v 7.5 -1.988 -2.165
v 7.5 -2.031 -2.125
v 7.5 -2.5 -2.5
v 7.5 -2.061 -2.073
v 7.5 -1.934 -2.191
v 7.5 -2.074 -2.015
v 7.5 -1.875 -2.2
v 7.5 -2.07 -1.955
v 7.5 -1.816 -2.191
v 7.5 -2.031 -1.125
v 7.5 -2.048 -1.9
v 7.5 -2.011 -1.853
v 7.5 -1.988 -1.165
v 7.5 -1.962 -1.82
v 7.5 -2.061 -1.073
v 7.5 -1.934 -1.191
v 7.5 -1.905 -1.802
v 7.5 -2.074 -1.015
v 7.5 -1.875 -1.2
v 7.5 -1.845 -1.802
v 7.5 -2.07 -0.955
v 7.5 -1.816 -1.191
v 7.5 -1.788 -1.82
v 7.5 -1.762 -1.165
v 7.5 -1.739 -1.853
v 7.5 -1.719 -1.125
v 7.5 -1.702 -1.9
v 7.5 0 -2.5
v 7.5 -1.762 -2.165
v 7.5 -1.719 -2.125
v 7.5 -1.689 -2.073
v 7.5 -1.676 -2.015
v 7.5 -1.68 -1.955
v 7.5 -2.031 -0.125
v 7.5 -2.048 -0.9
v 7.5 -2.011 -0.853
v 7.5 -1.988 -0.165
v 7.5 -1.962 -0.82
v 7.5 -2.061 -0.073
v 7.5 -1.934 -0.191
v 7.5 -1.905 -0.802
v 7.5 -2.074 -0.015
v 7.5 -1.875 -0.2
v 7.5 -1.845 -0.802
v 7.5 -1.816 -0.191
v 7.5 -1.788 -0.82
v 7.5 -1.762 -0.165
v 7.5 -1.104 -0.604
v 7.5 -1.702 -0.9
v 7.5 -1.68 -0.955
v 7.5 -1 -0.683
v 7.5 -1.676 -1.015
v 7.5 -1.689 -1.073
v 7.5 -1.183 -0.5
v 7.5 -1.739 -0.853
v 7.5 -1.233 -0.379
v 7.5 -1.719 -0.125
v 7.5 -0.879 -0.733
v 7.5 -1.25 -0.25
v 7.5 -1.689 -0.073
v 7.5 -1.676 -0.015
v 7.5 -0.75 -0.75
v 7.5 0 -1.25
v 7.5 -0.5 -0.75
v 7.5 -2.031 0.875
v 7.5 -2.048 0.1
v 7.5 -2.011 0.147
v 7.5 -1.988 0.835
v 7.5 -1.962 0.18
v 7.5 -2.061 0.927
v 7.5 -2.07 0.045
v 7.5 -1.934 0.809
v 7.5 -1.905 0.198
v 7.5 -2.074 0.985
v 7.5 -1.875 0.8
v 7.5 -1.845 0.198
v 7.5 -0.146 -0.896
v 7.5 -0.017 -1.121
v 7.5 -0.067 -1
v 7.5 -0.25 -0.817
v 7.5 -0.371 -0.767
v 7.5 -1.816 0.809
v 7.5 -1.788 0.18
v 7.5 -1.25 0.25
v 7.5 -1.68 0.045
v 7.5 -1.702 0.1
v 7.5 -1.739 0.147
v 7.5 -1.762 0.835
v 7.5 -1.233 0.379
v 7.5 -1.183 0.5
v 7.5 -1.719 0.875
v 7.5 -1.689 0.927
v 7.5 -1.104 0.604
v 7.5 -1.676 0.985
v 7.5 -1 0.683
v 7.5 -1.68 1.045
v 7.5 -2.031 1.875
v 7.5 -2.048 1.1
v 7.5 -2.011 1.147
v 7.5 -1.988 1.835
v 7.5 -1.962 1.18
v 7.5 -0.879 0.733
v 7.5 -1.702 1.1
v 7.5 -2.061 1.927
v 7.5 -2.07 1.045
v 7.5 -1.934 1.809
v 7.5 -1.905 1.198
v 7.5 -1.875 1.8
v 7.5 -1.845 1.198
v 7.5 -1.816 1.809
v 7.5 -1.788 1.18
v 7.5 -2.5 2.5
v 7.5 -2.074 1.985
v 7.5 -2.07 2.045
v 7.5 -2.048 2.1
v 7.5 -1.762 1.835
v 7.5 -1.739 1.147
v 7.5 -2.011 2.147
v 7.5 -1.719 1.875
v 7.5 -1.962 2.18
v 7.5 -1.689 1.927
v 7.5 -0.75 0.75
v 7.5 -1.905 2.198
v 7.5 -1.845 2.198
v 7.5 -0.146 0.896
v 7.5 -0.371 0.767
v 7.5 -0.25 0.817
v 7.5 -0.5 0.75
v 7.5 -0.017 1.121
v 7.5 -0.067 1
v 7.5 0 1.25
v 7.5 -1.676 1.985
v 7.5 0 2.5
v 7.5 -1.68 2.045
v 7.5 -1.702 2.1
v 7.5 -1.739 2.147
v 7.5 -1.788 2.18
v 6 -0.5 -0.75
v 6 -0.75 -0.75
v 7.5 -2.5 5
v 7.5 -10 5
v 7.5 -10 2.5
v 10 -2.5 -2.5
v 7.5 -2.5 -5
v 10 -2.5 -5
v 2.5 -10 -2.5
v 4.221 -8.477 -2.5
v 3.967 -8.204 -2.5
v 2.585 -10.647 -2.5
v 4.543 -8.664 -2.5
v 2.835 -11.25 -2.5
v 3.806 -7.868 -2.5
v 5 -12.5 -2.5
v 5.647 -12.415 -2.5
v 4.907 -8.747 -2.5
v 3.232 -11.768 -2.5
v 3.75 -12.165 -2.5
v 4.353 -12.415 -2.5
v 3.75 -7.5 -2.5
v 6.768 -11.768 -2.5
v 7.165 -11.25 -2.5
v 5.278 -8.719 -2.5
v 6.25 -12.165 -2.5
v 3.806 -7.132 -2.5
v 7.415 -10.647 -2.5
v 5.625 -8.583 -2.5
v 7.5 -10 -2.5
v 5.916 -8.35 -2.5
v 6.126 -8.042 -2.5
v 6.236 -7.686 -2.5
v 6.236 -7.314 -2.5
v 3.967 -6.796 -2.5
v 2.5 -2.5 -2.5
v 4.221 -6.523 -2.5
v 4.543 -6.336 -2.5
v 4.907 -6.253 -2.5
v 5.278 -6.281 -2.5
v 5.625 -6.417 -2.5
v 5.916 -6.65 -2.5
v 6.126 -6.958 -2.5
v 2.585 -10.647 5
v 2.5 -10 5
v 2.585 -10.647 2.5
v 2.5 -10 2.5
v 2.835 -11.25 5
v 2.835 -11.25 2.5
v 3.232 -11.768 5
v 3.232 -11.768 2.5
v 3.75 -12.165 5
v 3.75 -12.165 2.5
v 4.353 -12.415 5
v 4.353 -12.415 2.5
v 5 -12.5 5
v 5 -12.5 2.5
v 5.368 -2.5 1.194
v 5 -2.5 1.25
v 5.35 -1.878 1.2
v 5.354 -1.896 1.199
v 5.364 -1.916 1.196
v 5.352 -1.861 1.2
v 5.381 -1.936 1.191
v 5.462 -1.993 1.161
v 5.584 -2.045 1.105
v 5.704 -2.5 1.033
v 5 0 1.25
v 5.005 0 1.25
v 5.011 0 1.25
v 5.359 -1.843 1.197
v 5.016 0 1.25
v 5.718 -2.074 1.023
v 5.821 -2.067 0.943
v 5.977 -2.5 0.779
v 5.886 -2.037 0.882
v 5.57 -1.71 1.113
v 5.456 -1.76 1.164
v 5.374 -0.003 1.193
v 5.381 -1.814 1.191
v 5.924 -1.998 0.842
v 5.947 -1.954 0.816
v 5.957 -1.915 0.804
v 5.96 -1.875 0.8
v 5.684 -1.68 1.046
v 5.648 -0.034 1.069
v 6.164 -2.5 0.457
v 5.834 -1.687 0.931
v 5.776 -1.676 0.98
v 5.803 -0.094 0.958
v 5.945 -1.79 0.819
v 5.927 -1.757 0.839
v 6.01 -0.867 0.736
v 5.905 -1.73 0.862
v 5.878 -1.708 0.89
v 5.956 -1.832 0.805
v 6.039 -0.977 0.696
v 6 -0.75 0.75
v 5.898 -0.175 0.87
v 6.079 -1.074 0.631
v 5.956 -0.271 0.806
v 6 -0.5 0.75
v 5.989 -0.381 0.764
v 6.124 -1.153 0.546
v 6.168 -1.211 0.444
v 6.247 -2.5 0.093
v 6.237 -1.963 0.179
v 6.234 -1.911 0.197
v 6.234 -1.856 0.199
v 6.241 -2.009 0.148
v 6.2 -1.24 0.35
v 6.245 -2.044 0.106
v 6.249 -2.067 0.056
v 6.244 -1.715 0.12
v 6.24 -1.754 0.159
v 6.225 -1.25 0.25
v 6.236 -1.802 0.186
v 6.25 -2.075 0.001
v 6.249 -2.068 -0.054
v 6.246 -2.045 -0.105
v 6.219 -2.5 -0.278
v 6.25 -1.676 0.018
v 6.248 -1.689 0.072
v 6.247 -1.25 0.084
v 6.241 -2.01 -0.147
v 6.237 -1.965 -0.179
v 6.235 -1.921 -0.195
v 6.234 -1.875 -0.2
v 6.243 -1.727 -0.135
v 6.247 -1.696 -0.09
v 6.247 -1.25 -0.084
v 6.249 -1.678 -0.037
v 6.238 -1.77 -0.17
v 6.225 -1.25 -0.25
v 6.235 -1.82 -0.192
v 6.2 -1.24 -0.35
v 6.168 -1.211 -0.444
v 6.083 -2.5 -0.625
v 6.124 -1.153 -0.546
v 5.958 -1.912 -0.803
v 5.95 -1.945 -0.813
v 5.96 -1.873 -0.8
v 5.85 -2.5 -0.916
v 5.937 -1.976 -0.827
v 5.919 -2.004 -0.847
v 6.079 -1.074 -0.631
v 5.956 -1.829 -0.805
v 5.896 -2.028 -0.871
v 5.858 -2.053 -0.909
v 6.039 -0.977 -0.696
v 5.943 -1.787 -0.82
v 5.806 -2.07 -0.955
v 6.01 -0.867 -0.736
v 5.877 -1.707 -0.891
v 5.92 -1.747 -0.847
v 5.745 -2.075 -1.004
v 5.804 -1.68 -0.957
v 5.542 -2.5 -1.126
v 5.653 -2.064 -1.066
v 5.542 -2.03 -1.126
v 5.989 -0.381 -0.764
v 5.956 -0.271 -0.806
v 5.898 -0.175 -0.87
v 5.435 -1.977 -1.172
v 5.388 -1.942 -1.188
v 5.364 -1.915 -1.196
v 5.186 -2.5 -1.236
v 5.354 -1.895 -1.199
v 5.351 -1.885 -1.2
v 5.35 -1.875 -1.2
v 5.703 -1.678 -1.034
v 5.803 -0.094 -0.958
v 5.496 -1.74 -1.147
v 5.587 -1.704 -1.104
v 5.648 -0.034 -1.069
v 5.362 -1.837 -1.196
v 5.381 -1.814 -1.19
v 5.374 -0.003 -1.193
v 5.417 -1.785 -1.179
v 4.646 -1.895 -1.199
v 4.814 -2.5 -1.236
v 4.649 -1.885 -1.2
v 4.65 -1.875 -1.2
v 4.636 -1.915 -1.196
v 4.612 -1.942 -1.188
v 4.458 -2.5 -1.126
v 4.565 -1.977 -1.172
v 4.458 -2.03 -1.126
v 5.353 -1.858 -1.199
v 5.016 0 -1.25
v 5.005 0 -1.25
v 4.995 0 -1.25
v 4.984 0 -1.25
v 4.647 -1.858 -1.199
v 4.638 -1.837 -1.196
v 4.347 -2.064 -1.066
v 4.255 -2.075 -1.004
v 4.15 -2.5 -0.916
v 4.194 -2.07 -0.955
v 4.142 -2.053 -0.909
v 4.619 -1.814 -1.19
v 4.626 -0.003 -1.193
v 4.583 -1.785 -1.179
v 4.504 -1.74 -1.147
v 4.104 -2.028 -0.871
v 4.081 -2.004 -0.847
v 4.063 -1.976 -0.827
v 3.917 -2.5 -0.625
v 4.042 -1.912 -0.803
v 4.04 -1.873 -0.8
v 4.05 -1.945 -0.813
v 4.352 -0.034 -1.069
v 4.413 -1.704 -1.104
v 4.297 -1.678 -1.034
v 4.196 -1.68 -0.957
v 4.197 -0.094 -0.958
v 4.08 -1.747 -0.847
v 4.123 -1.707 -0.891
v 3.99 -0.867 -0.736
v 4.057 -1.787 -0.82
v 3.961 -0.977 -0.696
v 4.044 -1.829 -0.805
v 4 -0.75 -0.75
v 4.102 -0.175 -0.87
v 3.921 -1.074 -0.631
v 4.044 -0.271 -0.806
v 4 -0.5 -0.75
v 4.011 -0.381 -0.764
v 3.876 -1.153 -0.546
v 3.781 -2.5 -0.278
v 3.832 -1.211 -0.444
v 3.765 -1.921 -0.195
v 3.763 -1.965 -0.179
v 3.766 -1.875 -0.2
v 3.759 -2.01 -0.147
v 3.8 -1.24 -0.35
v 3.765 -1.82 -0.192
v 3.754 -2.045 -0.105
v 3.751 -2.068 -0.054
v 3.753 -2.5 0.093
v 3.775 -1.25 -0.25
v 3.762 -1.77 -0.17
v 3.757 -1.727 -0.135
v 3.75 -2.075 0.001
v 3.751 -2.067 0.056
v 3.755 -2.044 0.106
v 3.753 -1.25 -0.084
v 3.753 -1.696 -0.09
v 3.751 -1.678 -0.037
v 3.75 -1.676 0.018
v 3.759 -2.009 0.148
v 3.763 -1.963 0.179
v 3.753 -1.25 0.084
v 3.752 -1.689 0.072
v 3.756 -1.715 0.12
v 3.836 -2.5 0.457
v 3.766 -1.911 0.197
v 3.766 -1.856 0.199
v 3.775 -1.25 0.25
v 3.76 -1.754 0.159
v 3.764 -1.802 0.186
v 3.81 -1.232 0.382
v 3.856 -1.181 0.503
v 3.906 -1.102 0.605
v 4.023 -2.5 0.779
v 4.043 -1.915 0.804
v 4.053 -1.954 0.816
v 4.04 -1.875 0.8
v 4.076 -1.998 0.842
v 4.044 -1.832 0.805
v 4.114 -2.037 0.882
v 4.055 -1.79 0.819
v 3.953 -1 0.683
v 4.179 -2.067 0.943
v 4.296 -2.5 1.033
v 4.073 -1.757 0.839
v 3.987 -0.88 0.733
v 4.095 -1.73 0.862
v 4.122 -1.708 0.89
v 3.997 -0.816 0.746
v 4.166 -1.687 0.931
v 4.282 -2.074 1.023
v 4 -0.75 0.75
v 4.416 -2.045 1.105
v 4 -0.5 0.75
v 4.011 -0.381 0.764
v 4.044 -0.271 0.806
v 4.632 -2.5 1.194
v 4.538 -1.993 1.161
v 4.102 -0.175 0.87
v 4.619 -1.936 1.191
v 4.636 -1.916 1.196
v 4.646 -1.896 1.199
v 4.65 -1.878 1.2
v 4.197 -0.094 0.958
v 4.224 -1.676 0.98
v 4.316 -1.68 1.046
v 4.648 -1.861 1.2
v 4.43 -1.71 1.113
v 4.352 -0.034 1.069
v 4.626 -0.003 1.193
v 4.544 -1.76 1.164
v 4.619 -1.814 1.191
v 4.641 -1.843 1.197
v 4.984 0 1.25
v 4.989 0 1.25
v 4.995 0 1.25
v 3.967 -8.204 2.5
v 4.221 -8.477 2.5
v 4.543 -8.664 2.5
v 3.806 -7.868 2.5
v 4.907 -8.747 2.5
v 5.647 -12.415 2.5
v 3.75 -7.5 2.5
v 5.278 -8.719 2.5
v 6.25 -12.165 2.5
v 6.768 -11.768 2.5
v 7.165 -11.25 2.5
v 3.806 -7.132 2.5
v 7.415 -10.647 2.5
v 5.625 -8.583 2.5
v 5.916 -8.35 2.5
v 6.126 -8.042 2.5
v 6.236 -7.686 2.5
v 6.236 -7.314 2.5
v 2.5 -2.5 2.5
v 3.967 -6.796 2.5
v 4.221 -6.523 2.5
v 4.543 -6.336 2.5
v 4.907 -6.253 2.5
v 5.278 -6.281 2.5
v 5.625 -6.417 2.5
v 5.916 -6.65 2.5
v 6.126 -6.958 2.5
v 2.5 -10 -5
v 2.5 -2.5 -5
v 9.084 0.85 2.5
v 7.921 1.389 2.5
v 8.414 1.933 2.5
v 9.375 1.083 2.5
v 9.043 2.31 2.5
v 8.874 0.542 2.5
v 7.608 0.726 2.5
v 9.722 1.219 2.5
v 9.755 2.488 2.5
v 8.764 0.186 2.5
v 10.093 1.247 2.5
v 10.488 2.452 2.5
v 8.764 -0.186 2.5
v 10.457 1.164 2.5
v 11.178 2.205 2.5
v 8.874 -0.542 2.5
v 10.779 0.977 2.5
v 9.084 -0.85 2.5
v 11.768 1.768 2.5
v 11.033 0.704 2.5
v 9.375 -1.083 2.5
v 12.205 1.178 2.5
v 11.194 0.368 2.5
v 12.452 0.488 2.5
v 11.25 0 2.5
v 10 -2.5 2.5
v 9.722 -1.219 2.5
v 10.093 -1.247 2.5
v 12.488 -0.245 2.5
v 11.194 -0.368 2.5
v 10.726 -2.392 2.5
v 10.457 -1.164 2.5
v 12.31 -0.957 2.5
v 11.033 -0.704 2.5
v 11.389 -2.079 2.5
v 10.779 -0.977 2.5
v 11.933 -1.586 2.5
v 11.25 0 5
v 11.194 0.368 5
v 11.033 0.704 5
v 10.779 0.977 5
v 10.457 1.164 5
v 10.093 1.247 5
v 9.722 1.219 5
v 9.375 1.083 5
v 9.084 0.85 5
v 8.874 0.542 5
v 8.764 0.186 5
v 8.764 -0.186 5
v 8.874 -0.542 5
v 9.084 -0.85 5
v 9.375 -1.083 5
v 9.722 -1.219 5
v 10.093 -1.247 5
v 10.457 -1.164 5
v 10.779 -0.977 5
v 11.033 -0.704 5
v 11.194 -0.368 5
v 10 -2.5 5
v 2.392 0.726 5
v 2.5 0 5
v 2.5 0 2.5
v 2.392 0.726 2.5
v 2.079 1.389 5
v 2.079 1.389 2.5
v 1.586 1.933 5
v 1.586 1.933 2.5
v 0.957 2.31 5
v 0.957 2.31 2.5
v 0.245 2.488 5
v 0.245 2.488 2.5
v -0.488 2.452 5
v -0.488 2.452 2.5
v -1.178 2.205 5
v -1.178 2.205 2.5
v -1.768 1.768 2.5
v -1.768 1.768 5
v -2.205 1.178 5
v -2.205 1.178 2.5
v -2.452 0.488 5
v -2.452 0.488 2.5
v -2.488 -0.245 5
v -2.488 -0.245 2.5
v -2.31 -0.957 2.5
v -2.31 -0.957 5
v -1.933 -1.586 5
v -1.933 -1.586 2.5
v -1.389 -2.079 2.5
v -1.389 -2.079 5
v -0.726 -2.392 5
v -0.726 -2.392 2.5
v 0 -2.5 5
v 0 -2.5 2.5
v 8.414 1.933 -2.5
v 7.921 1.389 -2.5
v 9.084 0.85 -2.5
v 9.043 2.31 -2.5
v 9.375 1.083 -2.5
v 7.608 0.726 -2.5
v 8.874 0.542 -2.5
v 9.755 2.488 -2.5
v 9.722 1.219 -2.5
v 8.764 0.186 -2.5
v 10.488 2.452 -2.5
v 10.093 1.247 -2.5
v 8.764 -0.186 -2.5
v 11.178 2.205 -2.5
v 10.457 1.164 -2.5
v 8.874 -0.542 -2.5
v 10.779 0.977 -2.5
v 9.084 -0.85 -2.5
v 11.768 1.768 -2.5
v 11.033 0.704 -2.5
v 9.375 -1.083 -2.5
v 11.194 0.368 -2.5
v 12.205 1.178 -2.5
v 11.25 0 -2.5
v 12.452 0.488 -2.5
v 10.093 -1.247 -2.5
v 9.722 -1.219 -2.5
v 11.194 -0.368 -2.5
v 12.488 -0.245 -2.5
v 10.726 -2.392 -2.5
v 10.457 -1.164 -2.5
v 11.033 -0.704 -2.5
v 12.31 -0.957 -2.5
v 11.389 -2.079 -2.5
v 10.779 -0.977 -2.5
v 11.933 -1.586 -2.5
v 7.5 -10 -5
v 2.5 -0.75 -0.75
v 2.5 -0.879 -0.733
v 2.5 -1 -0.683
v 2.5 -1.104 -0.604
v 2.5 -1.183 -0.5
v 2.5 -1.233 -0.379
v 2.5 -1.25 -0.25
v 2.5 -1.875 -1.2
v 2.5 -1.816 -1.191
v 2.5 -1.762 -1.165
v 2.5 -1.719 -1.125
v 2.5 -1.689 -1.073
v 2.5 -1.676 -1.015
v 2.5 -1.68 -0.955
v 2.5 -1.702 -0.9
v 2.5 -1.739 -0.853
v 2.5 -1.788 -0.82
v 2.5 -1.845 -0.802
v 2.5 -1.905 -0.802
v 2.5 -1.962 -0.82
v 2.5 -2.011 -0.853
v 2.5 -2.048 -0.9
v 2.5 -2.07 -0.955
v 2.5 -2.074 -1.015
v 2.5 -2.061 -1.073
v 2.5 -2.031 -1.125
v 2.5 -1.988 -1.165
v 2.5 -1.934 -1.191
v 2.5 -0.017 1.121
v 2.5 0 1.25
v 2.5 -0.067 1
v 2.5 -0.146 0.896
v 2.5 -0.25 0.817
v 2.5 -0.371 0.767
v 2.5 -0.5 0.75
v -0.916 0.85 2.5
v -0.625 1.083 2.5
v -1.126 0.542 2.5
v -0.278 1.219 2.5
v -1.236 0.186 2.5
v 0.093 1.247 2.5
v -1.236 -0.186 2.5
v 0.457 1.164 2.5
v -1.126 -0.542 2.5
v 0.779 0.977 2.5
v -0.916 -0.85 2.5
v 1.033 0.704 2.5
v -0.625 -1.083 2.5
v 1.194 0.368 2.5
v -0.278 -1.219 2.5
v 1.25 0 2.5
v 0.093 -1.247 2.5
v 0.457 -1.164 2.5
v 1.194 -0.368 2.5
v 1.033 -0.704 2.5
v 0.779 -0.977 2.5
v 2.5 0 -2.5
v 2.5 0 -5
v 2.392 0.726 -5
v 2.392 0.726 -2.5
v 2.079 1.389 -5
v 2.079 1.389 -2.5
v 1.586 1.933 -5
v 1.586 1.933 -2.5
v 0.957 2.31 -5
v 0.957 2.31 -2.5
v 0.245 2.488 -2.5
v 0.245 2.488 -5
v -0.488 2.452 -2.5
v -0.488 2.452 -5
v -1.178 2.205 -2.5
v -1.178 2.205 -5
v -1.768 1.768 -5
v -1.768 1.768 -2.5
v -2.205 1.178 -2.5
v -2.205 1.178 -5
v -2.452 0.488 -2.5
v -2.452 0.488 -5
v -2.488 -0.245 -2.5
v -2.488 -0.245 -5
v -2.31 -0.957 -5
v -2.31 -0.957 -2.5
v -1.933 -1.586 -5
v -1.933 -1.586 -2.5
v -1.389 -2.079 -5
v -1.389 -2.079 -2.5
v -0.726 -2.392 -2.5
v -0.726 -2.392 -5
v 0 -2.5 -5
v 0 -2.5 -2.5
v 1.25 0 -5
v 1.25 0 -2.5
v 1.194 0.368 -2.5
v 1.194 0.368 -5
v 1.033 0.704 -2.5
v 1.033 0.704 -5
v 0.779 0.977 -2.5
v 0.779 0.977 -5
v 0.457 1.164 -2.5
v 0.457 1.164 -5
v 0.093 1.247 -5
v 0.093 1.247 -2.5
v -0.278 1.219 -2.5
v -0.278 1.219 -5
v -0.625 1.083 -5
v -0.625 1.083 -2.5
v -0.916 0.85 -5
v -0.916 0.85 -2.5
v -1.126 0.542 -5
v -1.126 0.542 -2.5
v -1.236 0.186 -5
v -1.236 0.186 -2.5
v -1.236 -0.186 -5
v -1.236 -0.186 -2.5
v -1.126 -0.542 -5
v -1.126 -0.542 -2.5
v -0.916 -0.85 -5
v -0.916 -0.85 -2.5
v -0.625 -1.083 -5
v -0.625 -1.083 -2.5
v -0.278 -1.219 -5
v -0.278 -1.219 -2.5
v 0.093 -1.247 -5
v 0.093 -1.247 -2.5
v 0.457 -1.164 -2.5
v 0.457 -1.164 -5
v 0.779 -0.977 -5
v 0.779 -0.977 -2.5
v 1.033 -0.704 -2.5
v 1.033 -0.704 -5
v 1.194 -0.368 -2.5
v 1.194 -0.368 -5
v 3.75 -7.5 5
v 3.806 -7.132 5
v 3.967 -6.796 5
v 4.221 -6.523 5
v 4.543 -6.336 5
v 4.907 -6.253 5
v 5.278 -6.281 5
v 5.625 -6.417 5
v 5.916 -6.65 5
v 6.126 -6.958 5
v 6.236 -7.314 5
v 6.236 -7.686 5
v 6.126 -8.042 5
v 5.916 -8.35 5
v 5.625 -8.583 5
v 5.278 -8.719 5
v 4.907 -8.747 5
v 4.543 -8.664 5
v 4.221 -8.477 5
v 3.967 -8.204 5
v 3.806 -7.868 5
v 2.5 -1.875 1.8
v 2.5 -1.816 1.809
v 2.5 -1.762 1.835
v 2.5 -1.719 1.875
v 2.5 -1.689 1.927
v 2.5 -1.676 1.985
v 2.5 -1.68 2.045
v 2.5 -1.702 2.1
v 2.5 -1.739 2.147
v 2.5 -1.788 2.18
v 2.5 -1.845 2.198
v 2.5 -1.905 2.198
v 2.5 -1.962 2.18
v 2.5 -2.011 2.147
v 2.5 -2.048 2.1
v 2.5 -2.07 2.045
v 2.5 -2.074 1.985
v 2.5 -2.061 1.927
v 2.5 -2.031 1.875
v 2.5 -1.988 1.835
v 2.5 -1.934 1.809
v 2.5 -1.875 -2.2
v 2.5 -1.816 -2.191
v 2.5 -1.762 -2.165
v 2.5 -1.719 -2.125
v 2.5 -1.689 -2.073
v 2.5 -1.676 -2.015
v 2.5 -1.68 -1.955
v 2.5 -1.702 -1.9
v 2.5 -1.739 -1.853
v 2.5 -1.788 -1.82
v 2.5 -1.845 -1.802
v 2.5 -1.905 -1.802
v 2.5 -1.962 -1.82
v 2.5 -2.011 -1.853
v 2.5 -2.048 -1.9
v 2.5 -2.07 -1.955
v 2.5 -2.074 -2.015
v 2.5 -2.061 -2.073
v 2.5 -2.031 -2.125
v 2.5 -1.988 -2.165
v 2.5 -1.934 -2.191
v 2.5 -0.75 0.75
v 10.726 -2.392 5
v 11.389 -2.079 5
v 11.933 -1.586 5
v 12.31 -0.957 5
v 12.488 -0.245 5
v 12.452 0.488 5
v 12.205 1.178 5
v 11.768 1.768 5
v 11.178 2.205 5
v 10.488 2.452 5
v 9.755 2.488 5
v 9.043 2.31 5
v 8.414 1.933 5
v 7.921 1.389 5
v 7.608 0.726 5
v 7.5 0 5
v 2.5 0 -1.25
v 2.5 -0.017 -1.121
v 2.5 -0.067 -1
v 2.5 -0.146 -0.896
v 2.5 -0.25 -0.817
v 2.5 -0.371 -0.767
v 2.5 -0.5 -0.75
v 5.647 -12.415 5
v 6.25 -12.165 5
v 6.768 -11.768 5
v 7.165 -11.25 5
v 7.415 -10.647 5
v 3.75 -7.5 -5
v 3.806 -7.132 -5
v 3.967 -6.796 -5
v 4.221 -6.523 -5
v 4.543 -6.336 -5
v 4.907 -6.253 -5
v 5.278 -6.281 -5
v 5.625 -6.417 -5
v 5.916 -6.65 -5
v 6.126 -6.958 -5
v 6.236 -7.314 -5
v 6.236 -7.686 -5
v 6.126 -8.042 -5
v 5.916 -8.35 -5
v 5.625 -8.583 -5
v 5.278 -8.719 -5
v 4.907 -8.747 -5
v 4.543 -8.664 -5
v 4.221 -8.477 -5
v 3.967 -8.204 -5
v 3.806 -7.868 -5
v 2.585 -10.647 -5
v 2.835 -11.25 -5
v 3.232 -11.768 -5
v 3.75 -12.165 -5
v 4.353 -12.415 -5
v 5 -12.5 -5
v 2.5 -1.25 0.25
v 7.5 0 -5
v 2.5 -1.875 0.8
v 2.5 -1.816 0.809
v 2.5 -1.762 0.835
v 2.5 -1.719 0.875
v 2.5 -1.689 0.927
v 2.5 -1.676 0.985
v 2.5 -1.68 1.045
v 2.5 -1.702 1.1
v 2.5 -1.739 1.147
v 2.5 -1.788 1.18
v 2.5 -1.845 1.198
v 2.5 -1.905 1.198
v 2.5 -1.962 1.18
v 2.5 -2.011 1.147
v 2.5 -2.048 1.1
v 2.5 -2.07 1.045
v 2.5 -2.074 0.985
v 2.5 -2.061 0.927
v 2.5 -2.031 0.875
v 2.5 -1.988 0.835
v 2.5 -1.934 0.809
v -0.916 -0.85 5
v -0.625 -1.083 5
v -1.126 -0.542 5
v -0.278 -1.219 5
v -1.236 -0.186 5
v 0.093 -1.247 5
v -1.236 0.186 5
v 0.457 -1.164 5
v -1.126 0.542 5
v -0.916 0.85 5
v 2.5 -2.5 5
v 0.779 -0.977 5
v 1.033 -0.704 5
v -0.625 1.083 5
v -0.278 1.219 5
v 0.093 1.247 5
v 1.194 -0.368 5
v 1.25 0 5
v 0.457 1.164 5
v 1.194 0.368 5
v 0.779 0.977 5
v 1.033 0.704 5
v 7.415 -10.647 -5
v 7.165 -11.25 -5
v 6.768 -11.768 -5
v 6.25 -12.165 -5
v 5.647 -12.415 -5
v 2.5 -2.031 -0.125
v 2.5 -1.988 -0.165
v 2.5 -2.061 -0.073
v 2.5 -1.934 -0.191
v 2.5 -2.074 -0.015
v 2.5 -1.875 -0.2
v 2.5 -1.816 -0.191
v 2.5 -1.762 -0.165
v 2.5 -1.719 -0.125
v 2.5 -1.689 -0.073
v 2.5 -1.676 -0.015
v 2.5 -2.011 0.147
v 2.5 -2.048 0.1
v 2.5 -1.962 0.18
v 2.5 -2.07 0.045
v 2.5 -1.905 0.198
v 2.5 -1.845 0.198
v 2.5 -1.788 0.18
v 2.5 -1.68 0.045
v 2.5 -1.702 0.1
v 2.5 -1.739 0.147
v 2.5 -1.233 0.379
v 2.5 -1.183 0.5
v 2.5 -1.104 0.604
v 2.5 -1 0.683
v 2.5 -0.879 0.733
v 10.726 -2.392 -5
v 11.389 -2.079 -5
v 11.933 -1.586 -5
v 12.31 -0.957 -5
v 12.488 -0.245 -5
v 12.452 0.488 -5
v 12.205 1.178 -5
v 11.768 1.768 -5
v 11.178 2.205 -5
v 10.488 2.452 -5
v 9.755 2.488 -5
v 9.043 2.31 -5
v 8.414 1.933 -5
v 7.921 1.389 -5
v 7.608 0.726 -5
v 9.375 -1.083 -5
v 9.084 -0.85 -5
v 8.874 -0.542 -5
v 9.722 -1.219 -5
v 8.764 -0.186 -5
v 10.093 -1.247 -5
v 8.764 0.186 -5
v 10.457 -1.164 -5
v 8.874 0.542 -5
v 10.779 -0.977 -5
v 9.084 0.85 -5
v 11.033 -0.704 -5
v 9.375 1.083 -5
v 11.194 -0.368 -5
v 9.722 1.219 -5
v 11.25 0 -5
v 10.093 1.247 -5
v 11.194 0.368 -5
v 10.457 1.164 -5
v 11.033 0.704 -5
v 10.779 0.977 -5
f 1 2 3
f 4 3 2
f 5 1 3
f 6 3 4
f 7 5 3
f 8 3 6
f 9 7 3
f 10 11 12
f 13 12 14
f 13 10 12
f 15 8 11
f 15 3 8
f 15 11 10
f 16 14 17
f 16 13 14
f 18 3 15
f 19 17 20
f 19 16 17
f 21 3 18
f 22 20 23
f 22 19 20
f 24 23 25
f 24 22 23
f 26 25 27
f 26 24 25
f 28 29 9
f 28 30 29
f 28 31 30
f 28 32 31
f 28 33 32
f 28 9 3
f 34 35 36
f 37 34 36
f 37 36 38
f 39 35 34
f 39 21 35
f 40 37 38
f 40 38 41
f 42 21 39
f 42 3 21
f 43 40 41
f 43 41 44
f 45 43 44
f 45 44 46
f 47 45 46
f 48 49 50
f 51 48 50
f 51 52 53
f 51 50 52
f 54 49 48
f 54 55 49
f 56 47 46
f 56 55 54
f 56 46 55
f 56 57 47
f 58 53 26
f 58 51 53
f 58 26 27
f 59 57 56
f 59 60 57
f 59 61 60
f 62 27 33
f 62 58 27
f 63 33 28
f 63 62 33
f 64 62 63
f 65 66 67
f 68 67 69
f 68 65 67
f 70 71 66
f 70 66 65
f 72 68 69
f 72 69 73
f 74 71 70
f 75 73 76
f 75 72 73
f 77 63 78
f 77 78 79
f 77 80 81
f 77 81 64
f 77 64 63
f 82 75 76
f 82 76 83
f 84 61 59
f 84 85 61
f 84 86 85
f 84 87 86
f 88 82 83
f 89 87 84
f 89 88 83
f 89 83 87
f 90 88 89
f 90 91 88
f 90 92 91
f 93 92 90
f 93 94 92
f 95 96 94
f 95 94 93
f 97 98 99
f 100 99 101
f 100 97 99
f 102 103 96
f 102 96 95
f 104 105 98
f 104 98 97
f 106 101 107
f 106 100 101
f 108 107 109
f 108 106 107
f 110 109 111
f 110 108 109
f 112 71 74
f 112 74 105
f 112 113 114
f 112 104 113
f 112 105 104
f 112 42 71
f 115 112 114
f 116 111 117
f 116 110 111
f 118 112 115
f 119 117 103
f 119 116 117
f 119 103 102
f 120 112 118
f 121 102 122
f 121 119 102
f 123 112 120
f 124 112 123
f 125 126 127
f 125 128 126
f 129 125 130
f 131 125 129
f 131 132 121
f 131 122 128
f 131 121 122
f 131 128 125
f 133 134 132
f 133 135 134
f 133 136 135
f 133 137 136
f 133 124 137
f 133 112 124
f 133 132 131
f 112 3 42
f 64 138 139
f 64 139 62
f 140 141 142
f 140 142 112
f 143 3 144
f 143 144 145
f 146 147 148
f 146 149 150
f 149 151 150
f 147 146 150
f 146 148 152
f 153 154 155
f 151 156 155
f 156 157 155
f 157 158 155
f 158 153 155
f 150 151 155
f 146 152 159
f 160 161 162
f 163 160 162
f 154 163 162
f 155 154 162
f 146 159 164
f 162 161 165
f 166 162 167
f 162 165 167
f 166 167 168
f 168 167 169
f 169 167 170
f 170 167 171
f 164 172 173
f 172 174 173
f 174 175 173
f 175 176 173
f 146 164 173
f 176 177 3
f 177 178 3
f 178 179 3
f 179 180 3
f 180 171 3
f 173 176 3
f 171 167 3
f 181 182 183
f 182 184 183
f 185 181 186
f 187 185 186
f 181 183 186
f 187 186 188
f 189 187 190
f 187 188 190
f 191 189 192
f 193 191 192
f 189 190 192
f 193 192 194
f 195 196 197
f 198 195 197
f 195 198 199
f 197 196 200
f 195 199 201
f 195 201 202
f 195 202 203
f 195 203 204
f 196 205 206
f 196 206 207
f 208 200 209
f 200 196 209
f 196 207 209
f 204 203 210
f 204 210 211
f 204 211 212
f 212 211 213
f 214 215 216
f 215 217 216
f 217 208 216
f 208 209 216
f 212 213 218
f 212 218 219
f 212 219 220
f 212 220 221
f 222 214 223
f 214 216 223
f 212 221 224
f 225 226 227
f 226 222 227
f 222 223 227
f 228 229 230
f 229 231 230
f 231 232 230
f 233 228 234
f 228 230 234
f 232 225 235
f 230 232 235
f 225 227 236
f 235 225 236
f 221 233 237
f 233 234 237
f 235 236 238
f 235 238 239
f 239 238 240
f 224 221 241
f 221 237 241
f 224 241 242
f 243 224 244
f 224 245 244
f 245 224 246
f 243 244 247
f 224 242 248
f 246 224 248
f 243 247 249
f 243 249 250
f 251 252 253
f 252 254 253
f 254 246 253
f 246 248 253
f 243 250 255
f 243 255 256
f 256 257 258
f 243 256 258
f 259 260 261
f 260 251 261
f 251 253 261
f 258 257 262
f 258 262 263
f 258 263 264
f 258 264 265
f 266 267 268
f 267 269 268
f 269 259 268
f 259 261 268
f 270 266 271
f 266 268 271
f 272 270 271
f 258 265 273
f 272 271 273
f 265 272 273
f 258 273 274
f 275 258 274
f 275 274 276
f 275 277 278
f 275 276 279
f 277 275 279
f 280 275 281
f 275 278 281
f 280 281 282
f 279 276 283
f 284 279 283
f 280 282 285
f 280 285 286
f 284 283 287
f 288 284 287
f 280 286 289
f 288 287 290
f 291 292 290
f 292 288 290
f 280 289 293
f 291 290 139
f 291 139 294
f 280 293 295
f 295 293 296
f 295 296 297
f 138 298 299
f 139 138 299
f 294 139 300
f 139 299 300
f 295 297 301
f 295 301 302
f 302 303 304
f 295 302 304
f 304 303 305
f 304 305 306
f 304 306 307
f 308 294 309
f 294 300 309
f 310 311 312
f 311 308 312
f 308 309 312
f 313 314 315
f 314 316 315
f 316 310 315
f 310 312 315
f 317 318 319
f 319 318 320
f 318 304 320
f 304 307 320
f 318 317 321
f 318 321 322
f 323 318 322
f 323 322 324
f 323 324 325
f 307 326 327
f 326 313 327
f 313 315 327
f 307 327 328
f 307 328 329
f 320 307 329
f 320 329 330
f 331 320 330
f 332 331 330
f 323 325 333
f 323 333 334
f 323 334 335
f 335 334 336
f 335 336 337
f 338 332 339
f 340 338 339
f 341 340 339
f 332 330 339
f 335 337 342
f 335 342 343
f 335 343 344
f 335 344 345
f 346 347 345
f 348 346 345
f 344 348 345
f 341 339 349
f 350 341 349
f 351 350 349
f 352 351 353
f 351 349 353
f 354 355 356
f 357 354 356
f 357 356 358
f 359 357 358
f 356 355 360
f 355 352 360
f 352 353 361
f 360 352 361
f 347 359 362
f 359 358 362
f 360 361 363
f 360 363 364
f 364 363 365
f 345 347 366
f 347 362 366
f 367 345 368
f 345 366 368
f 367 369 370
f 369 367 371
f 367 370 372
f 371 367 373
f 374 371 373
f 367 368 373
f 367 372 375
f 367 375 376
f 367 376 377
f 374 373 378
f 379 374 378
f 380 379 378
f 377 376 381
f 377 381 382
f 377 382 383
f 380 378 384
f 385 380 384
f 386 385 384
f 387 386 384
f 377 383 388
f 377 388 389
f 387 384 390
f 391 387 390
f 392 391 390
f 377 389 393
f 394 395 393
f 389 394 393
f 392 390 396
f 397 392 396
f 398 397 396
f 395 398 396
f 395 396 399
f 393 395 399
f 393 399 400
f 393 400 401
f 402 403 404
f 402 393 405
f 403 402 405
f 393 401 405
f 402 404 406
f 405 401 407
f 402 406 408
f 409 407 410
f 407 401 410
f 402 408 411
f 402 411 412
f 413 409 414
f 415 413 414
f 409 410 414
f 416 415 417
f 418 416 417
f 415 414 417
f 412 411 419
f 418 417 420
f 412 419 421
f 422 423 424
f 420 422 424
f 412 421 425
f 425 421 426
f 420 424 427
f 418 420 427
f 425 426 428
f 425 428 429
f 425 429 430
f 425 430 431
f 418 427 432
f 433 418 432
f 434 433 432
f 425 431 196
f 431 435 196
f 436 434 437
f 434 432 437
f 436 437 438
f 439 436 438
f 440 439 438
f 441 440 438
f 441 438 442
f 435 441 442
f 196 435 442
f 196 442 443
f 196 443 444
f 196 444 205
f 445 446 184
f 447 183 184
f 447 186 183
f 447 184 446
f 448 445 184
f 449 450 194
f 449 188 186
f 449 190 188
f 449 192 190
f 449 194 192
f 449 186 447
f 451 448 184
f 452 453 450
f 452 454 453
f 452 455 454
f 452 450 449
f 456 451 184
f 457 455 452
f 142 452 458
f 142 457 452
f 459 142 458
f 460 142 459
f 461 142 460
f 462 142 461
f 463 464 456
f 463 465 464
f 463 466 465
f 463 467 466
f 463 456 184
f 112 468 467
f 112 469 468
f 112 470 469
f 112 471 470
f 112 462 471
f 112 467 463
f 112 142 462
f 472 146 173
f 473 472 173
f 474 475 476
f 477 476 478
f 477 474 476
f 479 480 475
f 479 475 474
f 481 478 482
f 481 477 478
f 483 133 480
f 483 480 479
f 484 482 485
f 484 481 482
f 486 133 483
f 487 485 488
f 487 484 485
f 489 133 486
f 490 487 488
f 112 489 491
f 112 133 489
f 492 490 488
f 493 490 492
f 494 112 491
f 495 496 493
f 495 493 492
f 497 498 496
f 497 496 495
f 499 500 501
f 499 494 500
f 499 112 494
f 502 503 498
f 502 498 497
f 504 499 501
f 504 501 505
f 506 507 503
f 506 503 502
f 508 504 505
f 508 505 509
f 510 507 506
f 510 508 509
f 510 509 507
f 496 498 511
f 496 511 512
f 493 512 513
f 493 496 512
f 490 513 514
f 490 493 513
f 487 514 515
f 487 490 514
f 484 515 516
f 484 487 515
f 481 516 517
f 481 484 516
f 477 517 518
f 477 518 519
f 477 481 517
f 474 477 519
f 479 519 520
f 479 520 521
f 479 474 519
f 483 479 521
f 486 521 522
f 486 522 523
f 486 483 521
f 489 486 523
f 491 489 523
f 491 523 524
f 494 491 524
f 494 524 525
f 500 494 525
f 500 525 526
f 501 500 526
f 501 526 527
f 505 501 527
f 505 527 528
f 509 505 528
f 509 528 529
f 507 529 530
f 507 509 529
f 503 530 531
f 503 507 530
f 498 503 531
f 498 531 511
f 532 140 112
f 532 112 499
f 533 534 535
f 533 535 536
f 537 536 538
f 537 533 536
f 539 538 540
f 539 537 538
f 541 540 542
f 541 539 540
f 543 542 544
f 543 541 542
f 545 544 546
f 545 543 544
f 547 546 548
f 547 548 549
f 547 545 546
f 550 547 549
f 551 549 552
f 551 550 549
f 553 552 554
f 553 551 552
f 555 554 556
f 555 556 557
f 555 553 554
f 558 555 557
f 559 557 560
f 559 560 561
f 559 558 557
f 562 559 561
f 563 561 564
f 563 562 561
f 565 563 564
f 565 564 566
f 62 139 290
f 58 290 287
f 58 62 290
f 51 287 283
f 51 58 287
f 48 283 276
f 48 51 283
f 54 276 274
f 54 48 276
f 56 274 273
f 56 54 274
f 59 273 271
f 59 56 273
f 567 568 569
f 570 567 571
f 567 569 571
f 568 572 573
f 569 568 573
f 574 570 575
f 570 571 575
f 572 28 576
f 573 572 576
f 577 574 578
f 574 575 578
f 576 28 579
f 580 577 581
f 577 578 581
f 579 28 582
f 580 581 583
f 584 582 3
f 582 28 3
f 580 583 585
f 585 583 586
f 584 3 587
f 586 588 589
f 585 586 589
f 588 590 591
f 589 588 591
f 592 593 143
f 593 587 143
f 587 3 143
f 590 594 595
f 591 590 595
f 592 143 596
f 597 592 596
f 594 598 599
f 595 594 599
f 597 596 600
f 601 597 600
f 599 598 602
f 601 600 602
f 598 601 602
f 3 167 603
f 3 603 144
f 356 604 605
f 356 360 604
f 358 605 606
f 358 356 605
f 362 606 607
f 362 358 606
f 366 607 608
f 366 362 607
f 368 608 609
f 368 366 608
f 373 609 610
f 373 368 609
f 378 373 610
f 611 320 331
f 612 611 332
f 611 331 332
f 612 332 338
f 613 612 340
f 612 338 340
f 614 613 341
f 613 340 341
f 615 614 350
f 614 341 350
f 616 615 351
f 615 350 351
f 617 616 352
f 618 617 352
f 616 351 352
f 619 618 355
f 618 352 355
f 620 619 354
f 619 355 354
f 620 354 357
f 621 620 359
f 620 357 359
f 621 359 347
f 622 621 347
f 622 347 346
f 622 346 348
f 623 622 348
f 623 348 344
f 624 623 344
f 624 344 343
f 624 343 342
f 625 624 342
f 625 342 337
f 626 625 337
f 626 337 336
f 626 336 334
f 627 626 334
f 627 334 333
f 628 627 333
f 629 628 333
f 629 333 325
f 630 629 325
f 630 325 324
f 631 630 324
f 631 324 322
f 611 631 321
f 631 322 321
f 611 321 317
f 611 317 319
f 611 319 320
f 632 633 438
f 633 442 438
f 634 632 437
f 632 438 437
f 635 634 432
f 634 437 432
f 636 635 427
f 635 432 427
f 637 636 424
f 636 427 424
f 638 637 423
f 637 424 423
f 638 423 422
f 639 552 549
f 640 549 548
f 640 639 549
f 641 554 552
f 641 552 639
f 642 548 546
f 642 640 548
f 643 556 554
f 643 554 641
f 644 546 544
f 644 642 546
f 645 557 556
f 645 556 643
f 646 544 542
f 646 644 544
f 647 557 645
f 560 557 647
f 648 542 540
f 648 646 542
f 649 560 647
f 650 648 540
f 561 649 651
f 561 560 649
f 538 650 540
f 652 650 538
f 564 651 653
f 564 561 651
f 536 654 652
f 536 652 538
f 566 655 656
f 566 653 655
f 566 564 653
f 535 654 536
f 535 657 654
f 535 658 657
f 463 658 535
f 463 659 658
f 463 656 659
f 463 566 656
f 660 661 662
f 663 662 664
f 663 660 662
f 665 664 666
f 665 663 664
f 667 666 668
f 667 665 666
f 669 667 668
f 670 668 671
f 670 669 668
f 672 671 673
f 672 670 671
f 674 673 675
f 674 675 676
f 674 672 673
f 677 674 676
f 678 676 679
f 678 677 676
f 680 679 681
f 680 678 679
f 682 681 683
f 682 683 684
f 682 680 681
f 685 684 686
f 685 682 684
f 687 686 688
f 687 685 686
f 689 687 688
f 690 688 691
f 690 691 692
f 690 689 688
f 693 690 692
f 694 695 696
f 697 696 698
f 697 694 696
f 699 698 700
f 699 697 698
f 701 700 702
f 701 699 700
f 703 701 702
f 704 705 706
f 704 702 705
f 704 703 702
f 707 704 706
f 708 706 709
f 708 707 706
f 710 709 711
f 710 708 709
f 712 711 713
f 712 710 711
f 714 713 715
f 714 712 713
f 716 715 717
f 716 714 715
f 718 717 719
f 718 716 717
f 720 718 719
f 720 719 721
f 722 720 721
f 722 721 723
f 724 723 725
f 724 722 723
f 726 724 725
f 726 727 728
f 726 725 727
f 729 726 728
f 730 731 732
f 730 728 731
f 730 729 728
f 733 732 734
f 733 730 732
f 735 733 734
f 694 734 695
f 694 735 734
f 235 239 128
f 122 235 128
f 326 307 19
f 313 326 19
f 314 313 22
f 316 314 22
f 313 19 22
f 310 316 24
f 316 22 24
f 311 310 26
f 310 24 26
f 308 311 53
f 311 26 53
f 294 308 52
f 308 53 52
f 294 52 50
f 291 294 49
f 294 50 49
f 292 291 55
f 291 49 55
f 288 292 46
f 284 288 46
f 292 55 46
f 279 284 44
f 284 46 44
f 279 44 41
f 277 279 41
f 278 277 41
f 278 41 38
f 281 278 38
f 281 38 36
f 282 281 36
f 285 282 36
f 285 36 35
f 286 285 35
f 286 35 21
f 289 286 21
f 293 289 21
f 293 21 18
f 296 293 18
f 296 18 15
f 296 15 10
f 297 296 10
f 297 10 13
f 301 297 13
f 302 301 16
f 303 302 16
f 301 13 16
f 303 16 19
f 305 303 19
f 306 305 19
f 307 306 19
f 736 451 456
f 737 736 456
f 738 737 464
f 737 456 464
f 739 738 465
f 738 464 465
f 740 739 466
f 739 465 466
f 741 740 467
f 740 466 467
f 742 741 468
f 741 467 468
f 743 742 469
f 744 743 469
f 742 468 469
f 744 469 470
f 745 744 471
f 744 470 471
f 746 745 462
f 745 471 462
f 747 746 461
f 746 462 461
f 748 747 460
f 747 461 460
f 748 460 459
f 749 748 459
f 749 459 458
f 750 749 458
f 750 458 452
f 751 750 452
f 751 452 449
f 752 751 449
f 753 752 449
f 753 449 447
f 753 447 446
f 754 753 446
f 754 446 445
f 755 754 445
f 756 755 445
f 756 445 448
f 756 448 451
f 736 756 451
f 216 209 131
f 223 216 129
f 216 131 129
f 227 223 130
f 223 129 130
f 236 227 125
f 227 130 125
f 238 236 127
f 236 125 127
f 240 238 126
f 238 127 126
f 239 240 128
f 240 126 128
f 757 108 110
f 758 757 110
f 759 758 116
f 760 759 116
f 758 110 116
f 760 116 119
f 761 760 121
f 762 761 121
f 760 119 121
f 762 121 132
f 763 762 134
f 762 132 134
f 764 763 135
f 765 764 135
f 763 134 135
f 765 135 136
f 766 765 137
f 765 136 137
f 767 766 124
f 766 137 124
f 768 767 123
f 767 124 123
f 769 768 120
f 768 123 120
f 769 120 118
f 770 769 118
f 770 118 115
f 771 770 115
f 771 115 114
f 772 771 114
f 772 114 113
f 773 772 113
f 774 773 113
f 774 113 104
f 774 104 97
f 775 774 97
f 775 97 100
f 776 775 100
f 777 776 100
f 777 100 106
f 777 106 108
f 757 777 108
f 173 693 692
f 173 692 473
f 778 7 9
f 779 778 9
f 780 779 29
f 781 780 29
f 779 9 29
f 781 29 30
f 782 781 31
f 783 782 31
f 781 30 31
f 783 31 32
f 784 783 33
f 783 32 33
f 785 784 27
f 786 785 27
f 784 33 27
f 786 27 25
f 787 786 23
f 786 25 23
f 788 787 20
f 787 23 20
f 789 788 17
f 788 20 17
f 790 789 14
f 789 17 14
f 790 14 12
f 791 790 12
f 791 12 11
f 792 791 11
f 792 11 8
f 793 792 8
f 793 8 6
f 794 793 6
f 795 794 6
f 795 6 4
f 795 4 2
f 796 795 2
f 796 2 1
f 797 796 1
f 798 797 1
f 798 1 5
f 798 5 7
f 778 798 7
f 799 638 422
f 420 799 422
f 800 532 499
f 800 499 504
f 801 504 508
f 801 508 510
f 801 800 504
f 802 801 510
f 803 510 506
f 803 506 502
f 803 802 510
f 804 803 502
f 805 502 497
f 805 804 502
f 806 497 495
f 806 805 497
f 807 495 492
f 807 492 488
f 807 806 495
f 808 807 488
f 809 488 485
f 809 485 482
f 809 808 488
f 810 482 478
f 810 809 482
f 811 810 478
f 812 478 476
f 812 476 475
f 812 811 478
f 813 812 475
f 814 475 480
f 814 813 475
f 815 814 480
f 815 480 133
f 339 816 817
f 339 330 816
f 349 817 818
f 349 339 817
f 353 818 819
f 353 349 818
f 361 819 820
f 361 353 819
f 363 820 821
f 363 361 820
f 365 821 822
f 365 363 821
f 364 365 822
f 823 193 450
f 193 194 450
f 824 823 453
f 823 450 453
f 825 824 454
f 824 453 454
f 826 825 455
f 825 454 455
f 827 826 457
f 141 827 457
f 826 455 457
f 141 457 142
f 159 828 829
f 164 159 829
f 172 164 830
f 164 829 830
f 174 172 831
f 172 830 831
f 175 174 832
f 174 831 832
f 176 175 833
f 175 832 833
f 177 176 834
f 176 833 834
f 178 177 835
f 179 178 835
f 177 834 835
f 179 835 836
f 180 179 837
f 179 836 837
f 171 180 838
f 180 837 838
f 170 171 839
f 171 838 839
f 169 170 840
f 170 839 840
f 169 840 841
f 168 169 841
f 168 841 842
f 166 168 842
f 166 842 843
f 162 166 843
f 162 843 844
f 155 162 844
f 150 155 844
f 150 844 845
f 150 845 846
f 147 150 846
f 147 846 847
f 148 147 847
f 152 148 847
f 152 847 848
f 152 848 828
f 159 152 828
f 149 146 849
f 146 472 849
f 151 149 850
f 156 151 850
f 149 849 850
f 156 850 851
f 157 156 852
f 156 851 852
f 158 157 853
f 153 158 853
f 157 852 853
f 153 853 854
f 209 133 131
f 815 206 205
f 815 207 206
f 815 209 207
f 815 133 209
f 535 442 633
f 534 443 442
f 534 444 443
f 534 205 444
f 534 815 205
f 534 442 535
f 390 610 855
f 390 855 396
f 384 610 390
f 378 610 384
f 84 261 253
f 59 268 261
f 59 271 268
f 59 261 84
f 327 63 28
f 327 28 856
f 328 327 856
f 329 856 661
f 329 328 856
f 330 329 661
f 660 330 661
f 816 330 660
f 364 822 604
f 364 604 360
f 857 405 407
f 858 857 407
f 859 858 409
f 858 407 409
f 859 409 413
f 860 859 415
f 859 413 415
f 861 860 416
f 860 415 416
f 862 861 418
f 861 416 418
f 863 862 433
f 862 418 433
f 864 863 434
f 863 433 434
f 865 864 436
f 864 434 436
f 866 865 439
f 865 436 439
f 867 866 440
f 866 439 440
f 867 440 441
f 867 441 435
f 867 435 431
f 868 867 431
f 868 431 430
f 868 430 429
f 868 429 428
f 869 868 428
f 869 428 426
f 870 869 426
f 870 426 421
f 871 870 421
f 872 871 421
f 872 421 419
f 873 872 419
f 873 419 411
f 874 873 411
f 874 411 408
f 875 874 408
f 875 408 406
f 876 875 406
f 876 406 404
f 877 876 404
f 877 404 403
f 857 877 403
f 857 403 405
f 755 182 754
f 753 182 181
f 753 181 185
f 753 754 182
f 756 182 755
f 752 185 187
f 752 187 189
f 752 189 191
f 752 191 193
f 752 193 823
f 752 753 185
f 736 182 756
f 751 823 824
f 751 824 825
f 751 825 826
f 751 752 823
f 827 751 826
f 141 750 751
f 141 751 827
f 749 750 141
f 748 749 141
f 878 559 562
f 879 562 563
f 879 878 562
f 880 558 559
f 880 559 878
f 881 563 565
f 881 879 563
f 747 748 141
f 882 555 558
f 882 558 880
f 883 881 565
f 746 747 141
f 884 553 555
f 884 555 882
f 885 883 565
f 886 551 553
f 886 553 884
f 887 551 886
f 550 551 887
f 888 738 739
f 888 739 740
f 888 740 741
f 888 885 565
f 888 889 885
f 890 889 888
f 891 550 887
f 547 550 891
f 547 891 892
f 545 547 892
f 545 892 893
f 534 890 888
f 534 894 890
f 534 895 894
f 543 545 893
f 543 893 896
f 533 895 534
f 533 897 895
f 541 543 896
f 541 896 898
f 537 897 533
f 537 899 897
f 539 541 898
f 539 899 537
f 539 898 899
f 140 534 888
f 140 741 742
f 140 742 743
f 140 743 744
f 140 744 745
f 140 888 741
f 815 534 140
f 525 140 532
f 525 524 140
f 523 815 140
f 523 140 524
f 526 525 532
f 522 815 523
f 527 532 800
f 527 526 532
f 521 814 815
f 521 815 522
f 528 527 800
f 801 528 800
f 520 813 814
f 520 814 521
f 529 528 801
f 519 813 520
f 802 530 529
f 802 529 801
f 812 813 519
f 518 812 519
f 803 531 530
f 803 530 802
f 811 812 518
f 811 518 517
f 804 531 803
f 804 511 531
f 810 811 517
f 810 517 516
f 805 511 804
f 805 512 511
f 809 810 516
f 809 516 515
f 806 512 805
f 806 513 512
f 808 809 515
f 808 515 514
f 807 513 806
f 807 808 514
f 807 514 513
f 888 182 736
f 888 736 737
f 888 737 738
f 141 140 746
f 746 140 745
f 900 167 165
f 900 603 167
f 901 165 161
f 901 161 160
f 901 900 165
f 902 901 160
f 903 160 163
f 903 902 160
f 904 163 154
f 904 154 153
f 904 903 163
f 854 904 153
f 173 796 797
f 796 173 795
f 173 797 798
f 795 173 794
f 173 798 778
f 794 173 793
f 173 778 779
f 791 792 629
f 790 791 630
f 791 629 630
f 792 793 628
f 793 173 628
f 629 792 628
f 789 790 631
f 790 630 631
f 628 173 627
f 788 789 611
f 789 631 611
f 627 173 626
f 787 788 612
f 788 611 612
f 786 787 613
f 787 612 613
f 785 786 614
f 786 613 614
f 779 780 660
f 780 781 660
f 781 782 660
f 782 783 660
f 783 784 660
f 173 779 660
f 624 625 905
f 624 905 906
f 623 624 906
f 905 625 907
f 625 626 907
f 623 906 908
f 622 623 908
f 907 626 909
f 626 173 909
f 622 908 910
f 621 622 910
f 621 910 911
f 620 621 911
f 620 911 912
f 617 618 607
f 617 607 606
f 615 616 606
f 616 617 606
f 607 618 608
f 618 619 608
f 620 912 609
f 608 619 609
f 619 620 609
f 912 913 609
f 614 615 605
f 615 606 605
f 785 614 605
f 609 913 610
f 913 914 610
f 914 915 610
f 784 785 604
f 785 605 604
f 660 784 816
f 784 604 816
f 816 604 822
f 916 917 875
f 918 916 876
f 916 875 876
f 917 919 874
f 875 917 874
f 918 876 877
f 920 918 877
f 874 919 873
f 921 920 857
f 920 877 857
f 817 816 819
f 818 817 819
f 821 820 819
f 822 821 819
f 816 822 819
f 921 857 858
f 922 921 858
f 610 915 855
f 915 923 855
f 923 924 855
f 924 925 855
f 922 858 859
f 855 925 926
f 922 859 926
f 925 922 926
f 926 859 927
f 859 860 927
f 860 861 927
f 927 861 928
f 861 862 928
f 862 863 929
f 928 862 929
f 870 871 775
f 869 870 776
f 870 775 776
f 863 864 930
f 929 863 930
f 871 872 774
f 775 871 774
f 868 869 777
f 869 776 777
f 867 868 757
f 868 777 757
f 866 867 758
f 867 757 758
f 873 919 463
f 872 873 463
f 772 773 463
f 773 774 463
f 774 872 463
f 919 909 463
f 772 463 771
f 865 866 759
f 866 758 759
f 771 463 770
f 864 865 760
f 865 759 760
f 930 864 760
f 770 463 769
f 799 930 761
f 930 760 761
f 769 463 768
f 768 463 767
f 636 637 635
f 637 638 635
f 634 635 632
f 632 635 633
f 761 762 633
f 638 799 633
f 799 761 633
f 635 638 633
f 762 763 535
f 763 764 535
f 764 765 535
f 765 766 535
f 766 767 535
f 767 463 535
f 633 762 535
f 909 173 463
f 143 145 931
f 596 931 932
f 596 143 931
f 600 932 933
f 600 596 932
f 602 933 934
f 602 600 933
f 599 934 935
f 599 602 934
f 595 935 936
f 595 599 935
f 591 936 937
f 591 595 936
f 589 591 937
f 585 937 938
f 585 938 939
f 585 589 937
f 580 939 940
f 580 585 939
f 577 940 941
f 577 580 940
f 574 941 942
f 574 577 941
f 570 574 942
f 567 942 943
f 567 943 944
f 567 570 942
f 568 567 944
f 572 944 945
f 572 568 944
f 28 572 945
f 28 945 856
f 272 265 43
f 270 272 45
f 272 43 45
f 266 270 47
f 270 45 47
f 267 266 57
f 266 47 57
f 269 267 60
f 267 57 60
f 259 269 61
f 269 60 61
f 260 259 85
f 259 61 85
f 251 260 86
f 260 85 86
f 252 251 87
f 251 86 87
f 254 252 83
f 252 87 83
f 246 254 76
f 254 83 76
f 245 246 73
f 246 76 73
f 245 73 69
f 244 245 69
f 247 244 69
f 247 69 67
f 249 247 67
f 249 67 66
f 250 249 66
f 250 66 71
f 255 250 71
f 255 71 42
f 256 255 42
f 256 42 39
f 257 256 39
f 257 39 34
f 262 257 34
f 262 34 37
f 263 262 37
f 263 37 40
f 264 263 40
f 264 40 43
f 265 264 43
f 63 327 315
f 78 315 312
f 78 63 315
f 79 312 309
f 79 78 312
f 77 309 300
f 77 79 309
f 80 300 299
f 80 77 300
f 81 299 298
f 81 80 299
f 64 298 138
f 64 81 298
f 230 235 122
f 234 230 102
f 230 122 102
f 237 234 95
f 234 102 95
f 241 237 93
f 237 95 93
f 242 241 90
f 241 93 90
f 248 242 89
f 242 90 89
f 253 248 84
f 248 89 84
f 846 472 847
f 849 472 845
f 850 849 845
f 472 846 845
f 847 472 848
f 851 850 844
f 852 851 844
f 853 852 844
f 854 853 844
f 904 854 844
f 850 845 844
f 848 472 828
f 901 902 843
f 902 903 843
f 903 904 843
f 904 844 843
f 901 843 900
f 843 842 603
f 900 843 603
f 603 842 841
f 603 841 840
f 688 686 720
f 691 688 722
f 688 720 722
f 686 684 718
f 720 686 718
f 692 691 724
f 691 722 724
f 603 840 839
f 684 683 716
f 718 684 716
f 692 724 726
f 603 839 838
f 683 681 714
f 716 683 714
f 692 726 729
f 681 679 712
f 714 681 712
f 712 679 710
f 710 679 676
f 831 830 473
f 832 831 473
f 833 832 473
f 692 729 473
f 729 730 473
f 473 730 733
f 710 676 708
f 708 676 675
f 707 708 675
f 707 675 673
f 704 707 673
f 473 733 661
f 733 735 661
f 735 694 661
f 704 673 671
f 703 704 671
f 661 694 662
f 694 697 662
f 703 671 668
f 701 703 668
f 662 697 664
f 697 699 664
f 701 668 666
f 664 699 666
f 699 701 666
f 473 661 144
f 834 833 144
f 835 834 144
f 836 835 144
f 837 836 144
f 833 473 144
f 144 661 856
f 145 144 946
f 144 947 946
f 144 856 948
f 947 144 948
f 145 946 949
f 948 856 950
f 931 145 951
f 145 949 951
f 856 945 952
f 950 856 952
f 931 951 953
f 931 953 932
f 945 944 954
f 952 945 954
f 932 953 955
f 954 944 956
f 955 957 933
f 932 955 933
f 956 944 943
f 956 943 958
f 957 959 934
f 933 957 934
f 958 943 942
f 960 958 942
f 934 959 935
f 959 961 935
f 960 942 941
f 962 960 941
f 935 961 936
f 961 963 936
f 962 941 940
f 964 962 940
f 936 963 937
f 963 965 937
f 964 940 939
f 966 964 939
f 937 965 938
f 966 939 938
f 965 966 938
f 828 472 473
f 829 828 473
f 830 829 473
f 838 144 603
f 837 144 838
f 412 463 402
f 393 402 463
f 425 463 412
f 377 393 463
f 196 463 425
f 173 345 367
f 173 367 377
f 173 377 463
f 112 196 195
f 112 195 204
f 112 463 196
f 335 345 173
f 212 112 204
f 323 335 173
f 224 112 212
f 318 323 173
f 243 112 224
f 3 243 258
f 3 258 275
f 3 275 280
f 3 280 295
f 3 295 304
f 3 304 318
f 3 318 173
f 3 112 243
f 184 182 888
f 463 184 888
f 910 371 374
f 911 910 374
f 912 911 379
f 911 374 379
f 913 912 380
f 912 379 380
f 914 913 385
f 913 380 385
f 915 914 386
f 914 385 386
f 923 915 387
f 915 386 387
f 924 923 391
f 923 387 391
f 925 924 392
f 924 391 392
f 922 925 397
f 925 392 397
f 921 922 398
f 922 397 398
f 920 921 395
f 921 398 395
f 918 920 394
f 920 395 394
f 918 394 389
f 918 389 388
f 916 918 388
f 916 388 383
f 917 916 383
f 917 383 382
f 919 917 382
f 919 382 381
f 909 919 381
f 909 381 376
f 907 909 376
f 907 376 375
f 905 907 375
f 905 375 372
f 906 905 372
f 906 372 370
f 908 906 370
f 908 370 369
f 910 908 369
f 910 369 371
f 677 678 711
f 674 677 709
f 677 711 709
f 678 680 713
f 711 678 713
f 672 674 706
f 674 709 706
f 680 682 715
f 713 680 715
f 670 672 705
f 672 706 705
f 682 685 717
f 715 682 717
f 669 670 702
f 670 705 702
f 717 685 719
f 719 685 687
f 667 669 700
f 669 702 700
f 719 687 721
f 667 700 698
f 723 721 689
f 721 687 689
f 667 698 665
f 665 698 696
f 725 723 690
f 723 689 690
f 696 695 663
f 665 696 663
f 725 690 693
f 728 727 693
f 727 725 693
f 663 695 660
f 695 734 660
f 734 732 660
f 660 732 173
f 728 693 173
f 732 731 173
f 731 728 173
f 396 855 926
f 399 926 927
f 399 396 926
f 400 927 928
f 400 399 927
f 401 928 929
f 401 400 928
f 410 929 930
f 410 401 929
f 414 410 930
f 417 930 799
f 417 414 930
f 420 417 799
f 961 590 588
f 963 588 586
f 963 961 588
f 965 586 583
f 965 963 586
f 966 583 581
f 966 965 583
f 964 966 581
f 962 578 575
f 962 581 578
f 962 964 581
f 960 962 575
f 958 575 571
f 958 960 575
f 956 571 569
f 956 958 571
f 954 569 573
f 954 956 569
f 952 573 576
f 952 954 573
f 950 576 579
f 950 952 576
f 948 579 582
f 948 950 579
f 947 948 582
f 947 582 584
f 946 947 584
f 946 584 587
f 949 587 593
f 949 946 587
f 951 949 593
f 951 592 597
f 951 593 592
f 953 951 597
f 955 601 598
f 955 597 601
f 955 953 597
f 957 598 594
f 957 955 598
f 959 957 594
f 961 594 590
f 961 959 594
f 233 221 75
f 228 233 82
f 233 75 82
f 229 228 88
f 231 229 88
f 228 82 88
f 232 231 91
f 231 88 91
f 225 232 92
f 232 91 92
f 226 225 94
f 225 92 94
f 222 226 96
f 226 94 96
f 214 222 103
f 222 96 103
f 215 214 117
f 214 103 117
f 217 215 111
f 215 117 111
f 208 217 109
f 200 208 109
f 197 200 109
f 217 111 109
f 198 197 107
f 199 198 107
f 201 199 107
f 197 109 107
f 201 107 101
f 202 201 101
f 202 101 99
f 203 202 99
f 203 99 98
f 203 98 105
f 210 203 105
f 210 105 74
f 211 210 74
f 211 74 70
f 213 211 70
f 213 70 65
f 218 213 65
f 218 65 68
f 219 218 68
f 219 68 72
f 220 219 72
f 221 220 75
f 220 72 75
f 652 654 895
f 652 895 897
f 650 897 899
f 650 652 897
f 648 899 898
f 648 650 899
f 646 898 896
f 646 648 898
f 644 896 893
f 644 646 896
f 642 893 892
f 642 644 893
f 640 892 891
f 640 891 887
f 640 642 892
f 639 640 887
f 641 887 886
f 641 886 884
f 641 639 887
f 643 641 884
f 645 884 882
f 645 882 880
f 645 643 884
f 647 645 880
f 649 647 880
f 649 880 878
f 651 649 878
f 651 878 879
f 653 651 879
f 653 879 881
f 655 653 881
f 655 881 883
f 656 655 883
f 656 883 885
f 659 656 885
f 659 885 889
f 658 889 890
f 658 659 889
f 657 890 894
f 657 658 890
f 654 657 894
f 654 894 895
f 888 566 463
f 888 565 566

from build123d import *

# Parameters (mm, degrees)
SKETCH1_R               = 1.25
BOSS_EXTRUDE1_DEPTH     = 5
SKETCH2_R               = 1.25
CUT_EXTRUDE1_DEPTH      = 5
CUT_EXTRUDE2_DEPTH      = 14.693063938
CUT_EXTRUDE2_DEPTH_BACK = 14.693063938
SKETCH4_W               = 5
SKETCH4_H               = 5
SKETCH5_W               = 5
SKETCH5_H               = 1.5
CUT_EXTRUDE3_DEPTH      = 1.25
SKETCH6_R               = 0.2
CUT_EXTRUDE4_DEPTH      = 12.456439237
FILLET1_R               = 0.5
SKETCH7_W               = 5
SKETCH7_H               = 10
BOSS_EXTRUDE2_DEPTH     = 10
SKETCH9_R               = 1.25
CUT_EXTRUDE6_DEPTH      = 10
SKETCH11_W              = 5
SKETCH11_H              = 20
CUT_EXTRUDE7_DEPTH      = 10
FILLET3_R               = 2.5


with BuildPart() as part:
    # Sketch1 → Boss-Extrude1 (new, symmetric)
    with BuildSketch(Plane.XY):
        with BuildLine():
            ThreePointArc((2.5, 0), (-1.767766953, 1.767766953), (0, -2.5))
            Line((0, -2.5), (10, -2.5))
            ThreePointArc((10, -2.5), (11.767766953, 1.767766953), (7.5, 0))
            Line((7.5, 0), (2.5, 0))
        make_face()
        with Locations((10, 0)):
            Circle(SKETCH1_R, mode=Mode.SUBTRACT)
        Circle(SKETCH1_R, mode=Mode.SUBTRACT)
    extrude(amount=BOSS_EXTRUDE1_DEPTH, both=True)

    # Sketch2 → Cut-Extrude1 (cut)
    with BuildSketch(Plane(origin=(0, 0, 0), x_dir=(1, 0, 0), z_dir=(0, 1, 0))):
        with Locations(Location((5, 0, 0), (0, 0, 270))):
            Circle(SKETCH2_R)
    extrude(amount=-CUT_EXTRUDE1_DEPTH, mode=Mode.SUBTRACT)

    # Sketch4 → Cut-Extrude2 (cut, two sides: drawn at the far end of the back side and taken through both)
    with BuildSketch(Plane(origin=(0, 0, 0), x_dir=(1, 0, 0), z_dir=(0, 1, 0)).offset(-CUT_EXTRUDE2_DEPTH_BACK)):
        Rectangle(SKETCH4_W, SKETCH4_H)
        with Locations((10, 0)):
            Rectangle(SKETCH4_W, SKETCH4_H)
    extrude(amount=CUT_EXTRUDE2_DEPTH + CUT_EXTRUDE2_DEPTH_BACK, mode=Mode.SUBTRACT)

    # Sketch5 → Cut-Extrude3 (cut)
    with BuildSketch(Plane(origin=(0, 0, 0), x_dir=(1, 0, 0), z_dir=(0, 1, 0))):
        with Locations((5, 0)):
            Rectangle(SKETCH5_W, SKETCH5_H)
    extrude(amount=-CUT_EXTRUDE3_DEPTH, mode=Mode.SUBTRACT)

    # Sketch6 → Cut-Extrude4 (cut, through all)
    with BuildSketch(Plane(origin=(7.5, 0, 0), x_dir=(0, 0, -1), z_dir=(1, 0, 0))):
        with Locations((0, -1.875)):
            Circle(SKETCH6_R)
        with Locations((1, -1.875)):
            Circle(SKETCH6_R)
        with Locations((2, -1.875)):
            Circle(SKETCH6_R)
        with Locations((-1, -1.875)):
            Circle(SKETCH6_R)
        with Locations((-2, -1.875)):
            Circle(SKETCH6_R)
    extrude(amount=-CUT_EXTRUDE4_DEPTH, mode=Mode.SUBTRACT)

    # Fillet1
    fillet1_edges = [part.edges().sort_by_distance(p)[0] for p in [
        (6.75, -1.25, 0.75),
        (3.25, -1.25, 0.75),
        (3.25, -1.25, -0.75),
        (6.75, -1.25, -0.75),
        (6.75, 0, 0.75),
        (6.75, 0, -0.75),
        (3.25, 0, 0.75),
        (3.25, 0, -0.75),
    ]]
    fillet(fillet1_edges, radius=FILLET1_R - 0.0001)  # a hair under: the kernel refuses the full size

    # Sketch7 → Boss-Extrude2 (add)
    with BuildSketch(Plane.XY.offset(5)):
        with Locations((5, -7.5)):
            Rectangle(SKETCH7_W, SKETCH7_H)
    extrude(amount=-BOSS_EXTRUDE2_DEPTH)

    # Sketch9 → Cut-Extrude6 (cut)
    with BuildSketch(Plane(origin=(0, 0, -5), x_dir=(-1, 0, 0), z_dir=(0, 0, -1))):
        with Locations((-5, -7.5)):
            Circle(SKETCH9_R)
    extrude(amount=-CUT_EXTRUDE6_DEPTH, mode=Mode.SUBTRACT)

    # Sketch11 → Cut-Extrude7 (cut)
    with BuildSketch(Plane(origin=(7.5, 0, 0), x_dir=(0, 0, -1), z_dir=(1, 0, 0))):
        with Locations((0, -12.5)):
            Rectangle(SKETCH11_W, SKETCH11_H)
    extrude(amount=-CUT_EXTRUDE7_DEPTH, mode=Mode.SUBTRACT)

    # Fillet3
    fillet3_edges = [part.edges().sort_by_distance(p)[0] for p in [
        (2.5, -12.5, 3.75),
        (7.5, -12.5, 3.75),
        (2.5, -12.5, -3.75),
        (7.5, -12.5, -3.75),
    ]]
    fillet(fillet3_edges, radius=FILLET3_R - 0.0001)  # a hair under: the kernel refuses the full size


solid = part.part
